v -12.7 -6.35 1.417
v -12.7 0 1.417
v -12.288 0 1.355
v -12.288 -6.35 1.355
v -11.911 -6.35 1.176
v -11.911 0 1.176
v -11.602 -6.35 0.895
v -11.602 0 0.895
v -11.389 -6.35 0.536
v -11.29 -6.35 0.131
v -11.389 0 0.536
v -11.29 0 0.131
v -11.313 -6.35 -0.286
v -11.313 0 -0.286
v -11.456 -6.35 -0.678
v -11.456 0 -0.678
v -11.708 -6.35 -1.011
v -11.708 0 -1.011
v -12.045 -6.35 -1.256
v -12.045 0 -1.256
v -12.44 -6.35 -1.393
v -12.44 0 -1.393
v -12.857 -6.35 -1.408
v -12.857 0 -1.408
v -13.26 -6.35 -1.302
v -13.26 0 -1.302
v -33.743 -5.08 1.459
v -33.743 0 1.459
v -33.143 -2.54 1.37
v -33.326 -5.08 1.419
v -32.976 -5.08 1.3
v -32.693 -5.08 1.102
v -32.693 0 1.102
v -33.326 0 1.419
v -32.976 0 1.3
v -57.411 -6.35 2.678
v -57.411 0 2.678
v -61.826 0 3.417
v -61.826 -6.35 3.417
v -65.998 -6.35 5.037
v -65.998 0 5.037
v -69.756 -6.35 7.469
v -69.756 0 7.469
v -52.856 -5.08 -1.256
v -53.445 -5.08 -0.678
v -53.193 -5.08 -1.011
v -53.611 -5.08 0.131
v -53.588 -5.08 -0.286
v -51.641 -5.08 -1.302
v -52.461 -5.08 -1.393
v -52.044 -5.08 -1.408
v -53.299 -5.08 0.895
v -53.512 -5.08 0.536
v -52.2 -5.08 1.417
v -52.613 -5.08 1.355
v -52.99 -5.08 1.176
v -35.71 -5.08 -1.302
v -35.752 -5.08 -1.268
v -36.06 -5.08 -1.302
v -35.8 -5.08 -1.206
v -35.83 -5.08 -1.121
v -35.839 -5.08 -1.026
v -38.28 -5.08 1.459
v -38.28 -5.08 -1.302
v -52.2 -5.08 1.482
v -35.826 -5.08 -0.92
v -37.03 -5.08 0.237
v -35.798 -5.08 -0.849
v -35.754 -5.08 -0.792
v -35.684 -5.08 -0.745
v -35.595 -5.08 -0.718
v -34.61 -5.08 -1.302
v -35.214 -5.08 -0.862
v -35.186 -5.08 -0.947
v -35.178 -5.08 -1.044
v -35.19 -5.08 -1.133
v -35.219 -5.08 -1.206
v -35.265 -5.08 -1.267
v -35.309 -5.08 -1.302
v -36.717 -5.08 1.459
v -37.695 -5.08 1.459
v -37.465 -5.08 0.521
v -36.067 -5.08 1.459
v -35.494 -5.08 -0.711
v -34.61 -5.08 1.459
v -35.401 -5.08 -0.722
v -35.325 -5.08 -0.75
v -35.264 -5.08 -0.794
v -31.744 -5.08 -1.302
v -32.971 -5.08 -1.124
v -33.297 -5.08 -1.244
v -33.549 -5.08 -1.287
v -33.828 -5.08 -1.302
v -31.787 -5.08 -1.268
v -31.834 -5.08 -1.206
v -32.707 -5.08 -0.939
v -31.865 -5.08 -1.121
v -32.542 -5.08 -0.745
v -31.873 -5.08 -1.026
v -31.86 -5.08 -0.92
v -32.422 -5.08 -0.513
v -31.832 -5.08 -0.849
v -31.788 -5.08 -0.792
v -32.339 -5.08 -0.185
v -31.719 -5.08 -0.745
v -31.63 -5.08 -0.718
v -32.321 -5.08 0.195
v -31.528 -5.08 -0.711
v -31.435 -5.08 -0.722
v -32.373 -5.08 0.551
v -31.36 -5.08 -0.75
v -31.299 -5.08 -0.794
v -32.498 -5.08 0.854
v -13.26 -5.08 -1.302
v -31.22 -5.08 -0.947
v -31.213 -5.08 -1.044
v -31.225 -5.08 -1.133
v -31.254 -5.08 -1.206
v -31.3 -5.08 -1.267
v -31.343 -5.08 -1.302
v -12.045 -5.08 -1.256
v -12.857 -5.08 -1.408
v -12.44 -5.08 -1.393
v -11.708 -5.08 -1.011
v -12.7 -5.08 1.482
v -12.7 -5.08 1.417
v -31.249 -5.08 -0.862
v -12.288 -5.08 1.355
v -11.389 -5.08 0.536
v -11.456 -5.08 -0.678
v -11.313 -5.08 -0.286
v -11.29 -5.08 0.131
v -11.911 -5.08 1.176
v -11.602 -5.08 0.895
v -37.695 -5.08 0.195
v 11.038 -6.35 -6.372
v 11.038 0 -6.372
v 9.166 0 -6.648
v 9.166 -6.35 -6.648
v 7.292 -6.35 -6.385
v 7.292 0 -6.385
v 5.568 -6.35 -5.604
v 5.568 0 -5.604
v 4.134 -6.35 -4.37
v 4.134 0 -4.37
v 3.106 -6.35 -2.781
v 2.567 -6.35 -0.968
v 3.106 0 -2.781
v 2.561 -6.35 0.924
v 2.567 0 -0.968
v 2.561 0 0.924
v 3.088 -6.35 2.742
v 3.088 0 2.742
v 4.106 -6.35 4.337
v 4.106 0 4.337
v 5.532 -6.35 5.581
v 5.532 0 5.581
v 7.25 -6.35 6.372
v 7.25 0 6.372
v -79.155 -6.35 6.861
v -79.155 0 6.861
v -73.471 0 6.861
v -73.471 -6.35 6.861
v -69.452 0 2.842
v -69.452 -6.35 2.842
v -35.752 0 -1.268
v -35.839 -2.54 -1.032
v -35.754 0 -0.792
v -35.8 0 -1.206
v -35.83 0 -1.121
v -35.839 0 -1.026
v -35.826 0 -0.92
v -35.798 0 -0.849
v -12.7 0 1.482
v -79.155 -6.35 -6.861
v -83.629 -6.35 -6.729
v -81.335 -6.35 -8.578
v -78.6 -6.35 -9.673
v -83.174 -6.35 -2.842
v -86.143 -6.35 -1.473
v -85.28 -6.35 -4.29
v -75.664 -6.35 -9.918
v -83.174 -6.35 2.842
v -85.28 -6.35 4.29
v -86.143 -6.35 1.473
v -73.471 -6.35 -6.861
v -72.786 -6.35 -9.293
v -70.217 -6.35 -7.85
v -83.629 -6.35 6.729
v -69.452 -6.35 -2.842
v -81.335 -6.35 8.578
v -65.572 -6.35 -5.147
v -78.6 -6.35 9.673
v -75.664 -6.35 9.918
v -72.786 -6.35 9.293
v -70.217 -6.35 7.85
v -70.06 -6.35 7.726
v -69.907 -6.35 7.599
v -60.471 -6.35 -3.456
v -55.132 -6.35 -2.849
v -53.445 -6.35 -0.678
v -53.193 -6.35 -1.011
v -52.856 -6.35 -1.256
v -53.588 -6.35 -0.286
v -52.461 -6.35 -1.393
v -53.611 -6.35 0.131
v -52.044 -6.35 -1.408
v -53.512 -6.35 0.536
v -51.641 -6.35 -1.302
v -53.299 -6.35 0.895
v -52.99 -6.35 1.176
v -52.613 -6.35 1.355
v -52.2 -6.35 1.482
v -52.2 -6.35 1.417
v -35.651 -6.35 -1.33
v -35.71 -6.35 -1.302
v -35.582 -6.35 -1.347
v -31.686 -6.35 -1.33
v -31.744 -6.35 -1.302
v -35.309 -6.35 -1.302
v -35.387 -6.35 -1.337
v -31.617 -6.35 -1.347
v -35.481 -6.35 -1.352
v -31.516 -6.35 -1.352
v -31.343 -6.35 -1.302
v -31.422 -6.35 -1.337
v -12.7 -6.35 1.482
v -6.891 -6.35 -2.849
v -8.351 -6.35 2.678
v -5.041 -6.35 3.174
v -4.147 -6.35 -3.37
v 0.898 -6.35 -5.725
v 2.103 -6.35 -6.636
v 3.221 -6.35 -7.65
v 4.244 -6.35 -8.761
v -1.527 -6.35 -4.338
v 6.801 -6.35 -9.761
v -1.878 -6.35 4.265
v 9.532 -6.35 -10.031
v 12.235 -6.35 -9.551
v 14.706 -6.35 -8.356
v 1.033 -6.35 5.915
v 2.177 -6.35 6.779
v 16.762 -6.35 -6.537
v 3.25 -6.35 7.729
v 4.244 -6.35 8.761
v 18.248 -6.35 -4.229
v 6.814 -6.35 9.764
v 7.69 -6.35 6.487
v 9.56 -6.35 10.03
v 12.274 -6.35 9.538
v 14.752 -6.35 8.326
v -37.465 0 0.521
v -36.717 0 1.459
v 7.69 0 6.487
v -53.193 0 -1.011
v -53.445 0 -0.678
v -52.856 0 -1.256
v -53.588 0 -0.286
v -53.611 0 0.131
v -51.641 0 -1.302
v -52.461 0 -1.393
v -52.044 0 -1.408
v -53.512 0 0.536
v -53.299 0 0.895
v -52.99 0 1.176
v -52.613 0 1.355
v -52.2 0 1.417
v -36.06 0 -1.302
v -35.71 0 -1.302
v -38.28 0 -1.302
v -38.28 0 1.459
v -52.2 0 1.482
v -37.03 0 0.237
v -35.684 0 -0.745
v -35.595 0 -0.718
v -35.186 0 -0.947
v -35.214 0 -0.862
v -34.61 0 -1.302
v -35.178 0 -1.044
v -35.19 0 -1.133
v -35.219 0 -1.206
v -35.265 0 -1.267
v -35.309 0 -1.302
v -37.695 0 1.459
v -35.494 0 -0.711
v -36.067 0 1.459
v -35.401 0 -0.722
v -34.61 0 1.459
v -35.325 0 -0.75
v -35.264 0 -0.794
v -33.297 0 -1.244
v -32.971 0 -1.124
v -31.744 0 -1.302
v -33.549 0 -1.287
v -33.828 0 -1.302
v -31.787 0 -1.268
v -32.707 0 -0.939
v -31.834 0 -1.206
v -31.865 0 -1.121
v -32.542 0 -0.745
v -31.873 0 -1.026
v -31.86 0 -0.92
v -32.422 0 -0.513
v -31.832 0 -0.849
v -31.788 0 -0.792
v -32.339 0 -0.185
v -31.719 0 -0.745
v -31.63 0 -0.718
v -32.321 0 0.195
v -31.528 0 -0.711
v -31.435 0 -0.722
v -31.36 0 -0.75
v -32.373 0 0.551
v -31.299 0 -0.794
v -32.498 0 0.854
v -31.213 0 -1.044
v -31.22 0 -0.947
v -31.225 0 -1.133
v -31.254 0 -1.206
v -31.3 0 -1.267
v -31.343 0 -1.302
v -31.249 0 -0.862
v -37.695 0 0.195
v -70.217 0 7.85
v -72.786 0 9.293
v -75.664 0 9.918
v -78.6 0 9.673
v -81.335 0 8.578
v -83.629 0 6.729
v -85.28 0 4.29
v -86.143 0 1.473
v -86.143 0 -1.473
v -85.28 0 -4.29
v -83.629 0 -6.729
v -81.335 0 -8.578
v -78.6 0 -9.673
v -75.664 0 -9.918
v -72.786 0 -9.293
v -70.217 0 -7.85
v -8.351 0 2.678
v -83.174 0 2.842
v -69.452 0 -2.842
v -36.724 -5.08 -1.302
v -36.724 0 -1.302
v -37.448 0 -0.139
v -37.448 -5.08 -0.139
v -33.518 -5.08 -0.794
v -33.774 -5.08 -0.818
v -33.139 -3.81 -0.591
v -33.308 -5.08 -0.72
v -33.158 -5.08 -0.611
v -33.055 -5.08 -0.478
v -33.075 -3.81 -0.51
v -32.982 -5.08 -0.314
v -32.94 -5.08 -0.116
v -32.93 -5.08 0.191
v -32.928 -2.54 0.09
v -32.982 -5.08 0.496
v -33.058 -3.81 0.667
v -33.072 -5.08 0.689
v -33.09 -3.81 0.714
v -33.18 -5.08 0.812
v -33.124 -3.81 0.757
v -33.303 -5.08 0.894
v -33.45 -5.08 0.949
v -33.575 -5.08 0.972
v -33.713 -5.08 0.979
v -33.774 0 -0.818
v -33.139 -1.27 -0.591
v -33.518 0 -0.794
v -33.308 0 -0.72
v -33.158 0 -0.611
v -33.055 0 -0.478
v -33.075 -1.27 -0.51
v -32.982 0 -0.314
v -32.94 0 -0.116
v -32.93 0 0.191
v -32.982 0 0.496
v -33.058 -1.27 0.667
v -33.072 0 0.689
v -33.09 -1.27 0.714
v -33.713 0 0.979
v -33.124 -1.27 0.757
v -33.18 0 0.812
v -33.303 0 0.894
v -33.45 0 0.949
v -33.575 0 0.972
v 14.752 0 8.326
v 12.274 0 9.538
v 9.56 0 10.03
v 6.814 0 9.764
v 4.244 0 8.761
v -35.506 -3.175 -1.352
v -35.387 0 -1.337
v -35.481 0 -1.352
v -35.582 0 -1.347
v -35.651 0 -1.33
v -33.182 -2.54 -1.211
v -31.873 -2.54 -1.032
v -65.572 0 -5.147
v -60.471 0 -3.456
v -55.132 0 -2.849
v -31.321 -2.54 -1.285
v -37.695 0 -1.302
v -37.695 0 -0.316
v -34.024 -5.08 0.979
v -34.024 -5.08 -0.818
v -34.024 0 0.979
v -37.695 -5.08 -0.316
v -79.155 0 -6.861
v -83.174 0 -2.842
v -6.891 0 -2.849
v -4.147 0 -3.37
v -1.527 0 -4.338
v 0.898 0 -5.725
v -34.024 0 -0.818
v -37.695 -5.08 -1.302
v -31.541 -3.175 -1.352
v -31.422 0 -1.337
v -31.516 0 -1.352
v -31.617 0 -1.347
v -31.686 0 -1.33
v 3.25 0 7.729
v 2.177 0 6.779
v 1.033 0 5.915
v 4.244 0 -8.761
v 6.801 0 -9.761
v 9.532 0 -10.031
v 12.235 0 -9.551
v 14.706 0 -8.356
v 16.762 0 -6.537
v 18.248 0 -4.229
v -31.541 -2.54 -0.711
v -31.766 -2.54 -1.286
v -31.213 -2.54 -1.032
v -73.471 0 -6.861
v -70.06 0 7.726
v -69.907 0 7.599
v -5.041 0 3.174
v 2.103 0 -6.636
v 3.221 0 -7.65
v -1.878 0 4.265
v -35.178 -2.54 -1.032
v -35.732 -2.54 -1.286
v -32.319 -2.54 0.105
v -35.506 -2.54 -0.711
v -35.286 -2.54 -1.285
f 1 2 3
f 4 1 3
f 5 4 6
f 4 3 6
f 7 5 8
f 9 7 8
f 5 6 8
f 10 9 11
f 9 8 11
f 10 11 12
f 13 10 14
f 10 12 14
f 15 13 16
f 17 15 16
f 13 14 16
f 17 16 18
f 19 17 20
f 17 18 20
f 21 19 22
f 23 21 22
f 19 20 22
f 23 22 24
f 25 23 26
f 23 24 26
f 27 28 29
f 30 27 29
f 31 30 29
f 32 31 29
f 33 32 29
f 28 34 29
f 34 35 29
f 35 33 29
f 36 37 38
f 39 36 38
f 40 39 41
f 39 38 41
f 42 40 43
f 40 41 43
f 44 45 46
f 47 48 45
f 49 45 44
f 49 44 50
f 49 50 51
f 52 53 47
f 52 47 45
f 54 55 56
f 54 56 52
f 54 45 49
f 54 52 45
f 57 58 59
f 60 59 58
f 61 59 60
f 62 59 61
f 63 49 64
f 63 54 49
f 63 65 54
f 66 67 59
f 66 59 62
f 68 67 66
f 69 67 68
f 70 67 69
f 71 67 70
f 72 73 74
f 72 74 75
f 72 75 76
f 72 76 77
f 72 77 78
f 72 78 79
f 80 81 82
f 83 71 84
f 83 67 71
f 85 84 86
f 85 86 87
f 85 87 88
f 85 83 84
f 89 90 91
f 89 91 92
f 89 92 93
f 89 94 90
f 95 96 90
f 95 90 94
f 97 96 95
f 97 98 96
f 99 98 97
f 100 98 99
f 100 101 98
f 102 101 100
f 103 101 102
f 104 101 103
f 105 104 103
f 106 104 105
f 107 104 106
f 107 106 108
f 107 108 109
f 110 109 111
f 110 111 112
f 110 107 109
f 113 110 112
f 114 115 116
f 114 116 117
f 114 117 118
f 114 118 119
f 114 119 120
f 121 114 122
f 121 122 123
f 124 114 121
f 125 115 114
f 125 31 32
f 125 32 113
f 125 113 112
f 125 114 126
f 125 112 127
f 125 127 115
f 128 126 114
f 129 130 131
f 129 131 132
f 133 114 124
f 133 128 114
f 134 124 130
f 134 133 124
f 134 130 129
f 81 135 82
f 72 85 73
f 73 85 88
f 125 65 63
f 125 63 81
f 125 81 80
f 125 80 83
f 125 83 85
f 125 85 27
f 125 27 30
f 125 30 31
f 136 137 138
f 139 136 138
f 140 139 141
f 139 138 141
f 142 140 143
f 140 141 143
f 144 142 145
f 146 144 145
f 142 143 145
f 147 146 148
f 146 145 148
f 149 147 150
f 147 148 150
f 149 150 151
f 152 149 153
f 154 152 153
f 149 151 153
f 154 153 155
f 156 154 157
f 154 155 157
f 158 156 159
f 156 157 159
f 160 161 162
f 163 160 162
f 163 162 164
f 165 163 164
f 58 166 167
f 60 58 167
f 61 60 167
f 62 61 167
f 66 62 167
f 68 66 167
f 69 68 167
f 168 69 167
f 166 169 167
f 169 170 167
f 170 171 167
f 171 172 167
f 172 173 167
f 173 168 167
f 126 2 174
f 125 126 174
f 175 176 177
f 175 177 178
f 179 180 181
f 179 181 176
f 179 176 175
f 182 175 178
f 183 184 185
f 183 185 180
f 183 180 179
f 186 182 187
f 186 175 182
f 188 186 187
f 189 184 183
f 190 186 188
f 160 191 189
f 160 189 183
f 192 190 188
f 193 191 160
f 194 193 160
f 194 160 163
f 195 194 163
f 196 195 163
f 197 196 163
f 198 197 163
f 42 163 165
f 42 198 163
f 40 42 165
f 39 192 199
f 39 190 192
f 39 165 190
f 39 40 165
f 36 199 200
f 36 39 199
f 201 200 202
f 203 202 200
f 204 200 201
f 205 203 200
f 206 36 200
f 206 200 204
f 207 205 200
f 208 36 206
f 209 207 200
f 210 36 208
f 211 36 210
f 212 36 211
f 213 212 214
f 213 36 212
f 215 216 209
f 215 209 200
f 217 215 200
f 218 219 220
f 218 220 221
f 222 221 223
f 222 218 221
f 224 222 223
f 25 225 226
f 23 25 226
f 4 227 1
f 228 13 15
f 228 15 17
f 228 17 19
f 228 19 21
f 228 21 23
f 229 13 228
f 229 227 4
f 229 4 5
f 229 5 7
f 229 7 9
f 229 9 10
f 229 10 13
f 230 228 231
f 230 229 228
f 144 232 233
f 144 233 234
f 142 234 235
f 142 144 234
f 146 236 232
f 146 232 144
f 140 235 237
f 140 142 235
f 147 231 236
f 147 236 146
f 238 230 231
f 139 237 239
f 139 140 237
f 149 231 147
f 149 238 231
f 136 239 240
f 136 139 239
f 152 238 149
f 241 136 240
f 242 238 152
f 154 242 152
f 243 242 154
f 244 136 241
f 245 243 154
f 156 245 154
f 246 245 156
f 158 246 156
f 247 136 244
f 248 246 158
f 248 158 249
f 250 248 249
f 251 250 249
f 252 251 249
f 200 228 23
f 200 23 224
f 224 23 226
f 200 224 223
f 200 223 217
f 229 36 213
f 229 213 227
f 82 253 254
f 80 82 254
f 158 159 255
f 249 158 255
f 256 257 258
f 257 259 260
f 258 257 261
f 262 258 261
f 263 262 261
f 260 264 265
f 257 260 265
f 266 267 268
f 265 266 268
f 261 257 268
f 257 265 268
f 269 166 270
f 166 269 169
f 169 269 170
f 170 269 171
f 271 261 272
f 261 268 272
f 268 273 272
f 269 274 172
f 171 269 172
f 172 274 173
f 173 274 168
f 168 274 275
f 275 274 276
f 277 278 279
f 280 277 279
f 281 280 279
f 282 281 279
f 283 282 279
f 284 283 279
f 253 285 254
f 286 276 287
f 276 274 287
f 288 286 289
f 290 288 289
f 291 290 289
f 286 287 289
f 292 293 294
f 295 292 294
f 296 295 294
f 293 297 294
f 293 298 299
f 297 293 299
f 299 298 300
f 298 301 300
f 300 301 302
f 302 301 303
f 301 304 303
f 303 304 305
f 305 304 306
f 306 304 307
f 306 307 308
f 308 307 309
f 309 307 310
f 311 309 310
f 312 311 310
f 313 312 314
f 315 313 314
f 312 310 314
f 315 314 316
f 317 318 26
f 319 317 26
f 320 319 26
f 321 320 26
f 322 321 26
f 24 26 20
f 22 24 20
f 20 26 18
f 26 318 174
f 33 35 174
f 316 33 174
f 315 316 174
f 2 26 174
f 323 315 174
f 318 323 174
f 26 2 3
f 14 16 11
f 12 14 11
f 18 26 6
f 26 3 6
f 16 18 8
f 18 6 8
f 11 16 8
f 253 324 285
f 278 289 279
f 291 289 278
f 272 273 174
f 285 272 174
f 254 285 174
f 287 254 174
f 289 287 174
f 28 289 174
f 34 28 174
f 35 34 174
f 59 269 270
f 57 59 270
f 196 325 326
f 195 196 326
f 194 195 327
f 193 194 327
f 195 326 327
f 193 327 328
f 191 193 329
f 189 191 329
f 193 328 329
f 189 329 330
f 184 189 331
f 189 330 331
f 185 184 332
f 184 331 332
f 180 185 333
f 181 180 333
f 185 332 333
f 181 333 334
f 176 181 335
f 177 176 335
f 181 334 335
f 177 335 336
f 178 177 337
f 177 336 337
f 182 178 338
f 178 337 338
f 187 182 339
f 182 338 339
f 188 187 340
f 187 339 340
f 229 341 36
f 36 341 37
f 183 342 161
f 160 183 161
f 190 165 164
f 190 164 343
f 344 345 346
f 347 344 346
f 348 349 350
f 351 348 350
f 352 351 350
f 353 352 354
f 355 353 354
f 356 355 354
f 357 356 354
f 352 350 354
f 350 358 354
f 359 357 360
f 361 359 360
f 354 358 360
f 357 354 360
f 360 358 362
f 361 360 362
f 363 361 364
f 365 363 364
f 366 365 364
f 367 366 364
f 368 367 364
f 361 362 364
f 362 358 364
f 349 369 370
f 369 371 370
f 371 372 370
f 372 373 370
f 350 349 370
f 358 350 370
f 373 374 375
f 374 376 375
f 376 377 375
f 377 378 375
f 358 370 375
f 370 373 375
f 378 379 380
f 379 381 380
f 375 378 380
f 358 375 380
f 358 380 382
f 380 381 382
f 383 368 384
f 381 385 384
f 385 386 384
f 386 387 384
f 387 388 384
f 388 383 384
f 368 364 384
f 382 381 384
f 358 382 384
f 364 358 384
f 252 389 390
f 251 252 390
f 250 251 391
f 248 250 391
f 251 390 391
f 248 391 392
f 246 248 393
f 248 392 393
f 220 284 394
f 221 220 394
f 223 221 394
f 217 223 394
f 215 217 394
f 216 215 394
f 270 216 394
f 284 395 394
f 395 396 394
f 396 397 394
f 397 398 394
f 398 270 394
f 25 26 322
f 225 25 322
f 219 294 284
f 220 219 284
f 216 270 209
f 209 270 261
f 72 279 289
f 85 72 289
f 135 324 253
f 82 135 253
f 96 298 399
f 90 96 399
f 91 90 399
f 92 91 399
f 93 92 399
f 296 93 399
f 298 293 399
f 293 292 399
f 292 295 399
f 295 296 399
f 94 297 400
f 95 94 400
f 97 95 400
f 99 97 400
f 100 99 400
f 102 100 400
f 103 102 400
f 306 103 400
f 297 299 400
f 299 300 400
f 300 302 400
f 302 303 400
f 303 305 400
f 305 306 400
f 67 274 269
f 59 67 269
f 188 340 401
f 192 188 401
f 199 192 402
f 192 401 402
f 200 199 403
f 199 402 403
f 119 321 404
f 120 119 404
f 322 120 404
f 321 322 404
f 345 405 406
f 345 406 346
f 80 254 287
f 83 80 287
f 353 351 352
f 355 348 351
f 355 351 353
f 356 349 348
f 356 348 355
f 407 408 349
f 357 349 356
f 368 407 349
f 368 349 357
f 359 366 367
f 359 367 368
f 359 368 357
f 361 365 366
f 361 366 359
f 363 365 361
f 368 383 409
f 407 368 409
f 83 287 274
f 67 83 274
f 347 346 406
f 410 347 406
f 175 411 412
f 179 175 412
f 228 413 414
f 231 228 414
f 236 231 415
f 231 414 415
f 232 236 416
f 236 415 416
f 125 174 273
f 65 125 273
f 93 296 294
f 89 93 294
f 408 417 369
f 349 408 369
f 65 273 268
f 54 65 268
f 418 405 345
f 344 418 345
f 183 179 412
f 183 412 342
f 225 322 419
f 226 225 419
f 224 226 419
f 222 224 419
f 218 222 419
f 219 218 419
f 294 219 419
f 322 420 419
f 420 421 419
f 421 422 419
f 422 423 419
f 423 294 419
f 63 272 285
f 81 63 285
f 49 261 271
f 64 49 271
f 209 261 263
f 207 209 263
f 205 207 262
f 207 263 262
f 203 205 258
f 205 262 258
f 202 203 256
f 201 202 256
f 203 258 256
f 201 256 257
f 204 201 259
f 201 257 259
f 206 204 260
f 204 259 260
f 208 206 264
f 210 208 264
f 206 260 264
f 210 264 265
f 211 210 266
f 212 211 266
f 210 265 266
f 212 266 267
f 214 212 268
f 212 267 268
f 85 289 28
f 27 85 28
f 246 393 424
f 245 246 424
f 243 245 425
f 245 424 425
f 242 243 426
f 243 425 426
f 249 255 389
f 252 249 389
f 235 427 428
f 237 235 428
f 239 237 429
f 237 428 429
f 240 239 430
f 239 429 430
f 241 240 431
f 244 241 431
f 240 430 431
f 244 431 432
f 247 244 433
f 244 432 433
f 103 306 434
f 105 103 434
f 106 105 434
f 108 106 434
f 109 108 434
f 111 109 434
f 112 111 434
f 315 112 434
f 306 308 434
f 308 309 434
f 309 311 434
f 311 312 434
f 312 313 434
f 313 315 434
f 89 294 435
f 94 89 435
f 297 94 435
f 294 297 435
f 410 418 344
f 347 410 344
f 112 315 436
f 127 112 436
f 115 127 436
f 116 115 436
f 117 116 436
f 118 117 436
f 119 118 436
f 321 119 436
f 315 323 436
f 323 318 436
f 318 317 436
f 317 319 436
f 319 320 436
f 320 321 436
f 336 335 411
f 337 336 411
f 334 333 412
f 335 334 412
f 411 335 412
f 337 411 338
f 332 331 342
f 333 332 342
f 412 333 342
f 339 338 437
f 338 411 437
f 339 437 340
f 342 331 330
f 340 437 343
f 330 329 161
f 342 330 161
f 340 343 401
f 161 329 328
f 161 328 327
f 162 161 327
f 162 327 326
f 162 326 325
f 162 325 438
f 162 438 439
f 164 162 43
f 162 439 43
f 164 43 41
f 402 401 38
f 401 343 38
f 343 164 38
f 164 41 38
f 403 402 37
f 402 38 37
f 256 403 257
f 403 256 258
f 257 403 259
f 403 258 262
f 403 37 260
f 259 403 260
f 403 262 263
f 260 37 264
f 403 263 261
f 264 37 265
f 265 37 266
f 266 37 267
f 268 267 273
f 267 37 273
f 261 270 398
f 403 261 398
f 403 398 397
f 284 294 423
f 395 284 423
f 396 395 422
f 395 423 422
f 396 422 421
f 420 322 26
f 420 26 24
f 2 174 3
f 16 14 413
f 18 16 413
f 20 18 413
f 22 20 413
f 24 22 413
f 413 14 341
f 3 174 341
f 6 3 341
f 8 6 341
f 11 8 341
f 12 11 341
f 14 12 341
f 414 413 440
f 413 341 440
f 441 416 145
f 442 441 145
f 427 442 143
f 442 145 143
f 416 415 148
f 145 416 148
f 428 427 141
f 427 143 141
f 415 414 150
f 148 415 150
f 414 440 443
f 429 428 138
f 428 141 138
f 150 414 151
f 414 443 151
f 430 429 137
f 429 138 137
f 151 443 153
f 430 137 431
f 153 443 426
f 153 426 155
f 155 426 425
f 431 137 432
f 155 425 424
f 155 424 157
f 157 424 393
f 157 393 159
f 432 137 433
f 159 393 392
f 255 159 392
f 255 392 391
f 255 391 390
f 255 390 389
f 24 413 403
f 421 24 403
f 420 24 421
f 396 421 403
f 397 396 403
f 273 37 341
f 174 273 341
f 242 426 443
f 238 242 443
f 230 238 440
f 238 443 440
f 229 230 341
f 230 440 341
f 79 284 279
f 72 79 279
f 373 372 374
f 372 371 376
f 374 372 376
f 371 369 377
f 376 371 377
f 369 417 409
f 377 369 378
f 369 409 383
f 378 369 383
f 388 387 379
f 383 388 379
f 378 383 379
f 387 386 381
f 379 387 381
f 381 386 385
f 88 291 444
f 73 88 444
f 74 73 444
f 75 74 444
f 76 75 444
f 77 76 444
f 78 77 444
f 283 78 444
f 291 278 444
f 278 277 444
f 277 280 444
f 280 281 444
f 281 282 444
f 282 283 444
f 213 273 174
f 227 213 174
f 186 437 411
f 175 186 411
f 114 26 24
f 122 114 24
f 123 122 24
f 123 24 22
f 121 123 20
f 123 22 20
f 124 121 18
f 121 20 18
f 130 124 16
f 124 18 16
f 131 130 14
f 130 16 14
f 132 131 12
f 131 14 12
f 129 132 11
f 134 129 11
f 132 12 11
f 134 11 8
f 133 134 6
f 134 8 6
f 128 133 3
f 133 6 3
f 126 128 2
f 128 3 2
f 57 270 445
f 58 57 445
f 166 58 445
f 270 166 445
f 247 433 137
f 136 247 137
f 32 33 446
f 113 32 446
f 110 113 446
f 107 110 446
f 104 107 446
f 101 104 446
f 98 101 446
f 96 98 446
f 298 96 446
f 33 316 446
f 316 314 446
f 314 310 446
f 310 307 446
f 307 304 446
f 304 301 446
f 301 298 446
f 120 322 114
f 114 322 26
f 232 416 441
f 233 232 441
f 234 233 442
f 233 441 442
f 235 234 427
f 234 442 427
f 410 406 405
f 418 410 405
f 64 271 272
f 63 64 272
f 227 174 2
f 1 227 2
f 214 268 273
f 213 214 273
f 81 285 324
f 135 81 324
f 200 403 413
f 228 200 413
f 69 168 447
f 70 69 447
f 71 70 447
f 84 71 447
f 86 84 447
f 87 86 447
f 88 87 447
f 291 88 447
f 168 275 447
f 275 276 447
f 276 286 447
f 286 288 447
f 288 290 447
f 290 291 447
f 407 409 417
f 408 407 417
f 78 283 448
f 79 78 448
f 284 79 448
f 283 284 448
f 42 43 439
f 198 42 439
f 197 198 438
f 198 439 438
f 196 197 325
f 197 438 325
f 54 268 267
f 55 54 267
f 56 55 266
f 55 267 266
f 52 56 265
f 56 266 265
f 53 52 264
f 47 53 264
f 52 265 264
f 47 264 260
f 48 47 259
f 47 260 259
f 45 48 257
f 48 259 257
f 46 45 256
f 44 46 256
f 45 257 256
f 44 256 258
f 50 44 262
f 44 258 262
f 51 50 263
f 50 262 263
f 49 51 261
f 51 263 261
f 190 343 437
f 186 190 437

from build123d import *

# Parameters (mm, degrees)
F1_DEPTH = 5.08
F2_DEPTH = 6.35


with BuildPart() as f1:
    # F0 (on Front) → F1 (new body)
    with BuildSketch(Plane.XZ):
        Polygon((-37.6947642991, -0.3162783257), (-37.6947642991, -1.3017182937), (-36.7244291742, -1.3017182937), (-37.4476490649, -0.1386453701), align=None)
    extrude(amount=F1_DEPTH)


with BuildPart() as f1b:
    # F0 (on Front) → F1, piece 2 (new body)
    with BuildSketch(Plane.XZ):
        with BuildLine():
            add(Edge.make_bspline(
                [(-33.7735470137, -0.8183633124), (-32.9276757965, -0.8183633124), (-32.9276757965, 0.0897398586)],
                knots=[0, 0, 0, 1, 1, 1], degree=2))
            add(Edge.make_bspline(
                [(-32.9276757965, 0.0897398586), (-32.9276757965, 0.9791130241), (-33.7131276411, 0.9791130241)],
                knots=[0, 0, 0, 1, 1, 1], degree=2))
            Line((-33.7131276411, 0.9791130241), (-34.0242874102, 0.9791130241))
            Line((-34.0242874102, 0.9791130241), (-34.0242874102, -0.8183633124))
            Line((-34.0242874102, -0.8183633124), (-33.7735470137, -0.8183633124))
        make_face()
    extrude(amount=F1_DEPTH)


with BuildPart() as f1c:
    # F0 (on Front) → F1, piece 3 (new body)
    with BuildSketch(Plane.XZ):
        with BuildLine():
            ThreePointArc((-52.2002466023, 1.4169405788), (-53.5880827015, -0.2857123828), (-51.6405591111, -1.3017182937))
            Line((-51.6405591111, -1.3017182937), (-38.2802280201, -1.3017182937))
            Line((-38.2802280201, -1.3017182937), (-38.2802280201, 1.4588428429))
            Line((-38.2802280201, 1.4588428429), (-37.6947642991, 1.4588428429))
            Line((-37.6947642991, 1.4588428429), (-37.6947642991, 0.1954737607))
            Line((-37.6947642991, 0.1954737607), (-37.4645664893, 0.5205299856))
            Line((-37.4645664893, 0.5205299856), (-36.7165746558, 1.4588428429))
            Line((-36.7165746558, 1.4588428429), (-36.0670663997, 1.4588428429))
            Line((-36.0670663997, 1.4588428429), (-37.0301511999, 0.2371631278))
            Line((-37.0301511999, 0.2371631278), (-36.059816075, -1.3017182937))
            Line((-36.059816075, -1.3017182937), (-35.7097975851, -1.3017182937))
            add(Edge.make_bspline(
                [(-35.7097975851, -1.3017182937), (-35.7326776428, -1.2871840866), (-35.7519793713, -1.2684876387)],
                knots=[0.7773779948, 0.7773779948, 0.7773779948, 1, 1, 1], degree=2))
            add(Edge.make_bspline(
                [(-35.7519793713, -1.2684876387), (-35.8386811711, -1.1845047107), (-35.8386811711, -1.0316436979)],
                knots=[0, 0, 0, 1, 1, 1], degree=2))
            add(Edge.make_bspline(
                [(-35.8386811711, -1.0316436979), (-35.8386811711, -0.8733449416), (-35.7537919525, -0.7920808853)],
                knots=[0, 0, 0, 1, 1, 1], degree=2))
            add(Edge.make_bspline(
                [(-35.7537919525, -0.7920808853), (-35.6689027339, -0.7108168291), (-35.5063746215, -0.7108168291)],
                knots=[0, 0, 0, 1, 1, 1], degree=2))
            add(Edge.make_bspline(
                [(-35.5063746215, -0.7108168291), (-35.3498884463, -0.7108168291), (-35.2640929371, -0.7938934665)],
                knots=[0, 0, 0, 1, 1, 1], degree=2))
            add(Edge.make_bspline(
                [(-35.2640929371, -0.7938934665), (-35.178297428, -0.8769701039), (-35.178297428, -1.0316436979)],
                knots=[0, 0, 0, 1, 1, 1], degree=2))
            add(Edge.make_bspline(
                [(-35.178297428, -1.0316436979), (-35.178297428, -1.1808795484), (-35.2649992277, -1.2666750575)],
                knots=[0, 0, 0, 1, 1, 1], degree=2))
            add(Edge.make_bspline(
                [(-35.2649992277, -1.2666750575), (-35.2850167295, -1.2864833171), (-35.3086574309, -1.3017182937)],
                knots=[0, 0, 0, 0.2308775808, 0.2308775808, 0.2308775808], degree=2))
            Line((-35.3086574309, -1.3017182937), (-34.6097511313, -1.3017182937))
            Line((-34.6097511313, -1.3017182937), (-34.6097511313, 1.4588428429))
            Line((-34.6097511313, 1.4588428429), (-33.7433373274, 1.4588428429))
            add(Edge.make_bspline(
                [(-33.7433373274, 1.4588428429), (-33.0672445474, 1.4588428429), (-32.6932486306, 1.1020664474)],
                knots=[0, 0, 0, 1, 1, 1], degree=2))
            add(Edge.make_bspline(
                [(-32.6932486306, 1.1020664474), (-32.3192527139, 0.7452900519), (-32.3192527139, 0.1048447017)],
                knots=[0, 0, 0, 1, 1, 1], degree=2))
            add(Edge.make_bspline(
                [(-32.3192527139, 0.1048447017), (-32.3192527139, -0.5766858218), (-32.7074471832, -0.9392020578)],
                knots=[0, 0, 0, 1, 1, 1], degree=2))
            add(Edge.make_bspline(
                [(-32.7074471832, -0.9392020578), (-33.0956416525, -1.3017182937), (-33.8279244491, -1.3017182937)],
                knots=[0, 0, 0, 1, 1, 1], degree=2))
            Line((-33.8279244491, -1.3017182937), (-31.7444741577, -1.3017182937))
            add(Edge.make_bspline(
                [(-31.7444741577, -1.3017182937), (-31.7673542154, -1.2871840866), (-31.7866559439, -1.2684876387)],
                knots=[0.7773779948, 0.7773779948, 0.7773779948, 1, 1, 1], degree=2))
            add(Edge.make_bspline(
                [(-31.7866559439, -1.2684876387), (-31.8733577437, -1.1845047107), (-31.8733577437, -1.0316436979)],
                knots=[0, 0, 0, 1, 1, 1], degree=2))
            add(Edge.make_bspline(
                [(-31.8733577437, -1.0316436979), (-31.8733577437, -0.8733449416), (-31.7884685251, -0.7920808853)],
                knots=[0, 0, 0, 1, 1, 1], degree=2))
            add(Edge.make_bspline(
                [(-31.7884685251, -0.7920808853), (-31.7035793065, -0.7108168291), (-31.5410511941, -0.7108168291)],
                knots=[0, 0, 0, 1, 1, 1], degree=2))
            add(Edge.make_bspline(
                [(-31.5410511941, -0.7108168291), (-31.3845650189, -0.7108168291), (-31.2987695098, -0.7938934665)],
                knots=[0, 0, 0, 1, 1, 1], degree=2))
            add(Edge.make_bspline(
                [(-31.2987695098, -0.7938934665), (-31.2129740006, -0.8769701039), (-31.2129740006, -1.0316436979)],
                knots=[0, 0, 0, 1, 1, 1], degree=2))
            add(Edge.make_bspline(
                [(-31.2129740006, -1.0316436979), (-31.2129740006, -1.1808795484), (-31.2996758003, -1.2666750575)],
                knots=[0, 0, 0, 1, 1, 1], degree=2))
            add(Edge.make_bspline(
                [(-31.2996758003, -1.2666750575), (-31.3196933021, -1.2864833171), (-31.3433340035, -1.3017182937)],
                knots=[0, 0, 0, 0.2308775808, 0.2308775808, 0.2308775808], degree=2))
            Line((-31.3433340035, -1.3017182937), (-13.2601651062, -1.3017182937))
            ThreePointArc((-13.2601651062, -1.3017182937), (-11.3126415158, -0.2857123828), (-12.700477615, 1.4169405788))
            Line((-12.700477615, 1.4169405788), (-12.700477615, 1.4824063983))
            Line((-12.700477615, 1.4824063983), (-52.2002466023, 1.4824063983))
            Line((-52.2002466023, 1.4824063983), (-52.2002466023, 1.4169405788))
        make_face()
    extrude(amount=F1_DEPTH)


with BuildPart() as f2:
    # F0 (on Front) → F2 (new body)
    with BuildSketch(Plane.XZ):
        with BuildLine():
            ThreePointArc((-69.7555214797, 7.4693989174), (-69.9874280313, 7.658312579), (-70.216737524, 7.8503703223))
            ThreePointArc((-70.216737524, 7.8503703223), (-86.2529528158, 0), (-70.216737524, -7.8503703223))
            ThreePointArc((-70.216737524, -7.8503703223), (-67.3859848234, -4.37028343), (-66.3736665078, 0))
            ThreePointArc((-66.3736665078, 0), (-67.2585158917, 4.0996604505), (-69.7555214797, 7.4693989174))
        make_face()
        Polygon((-73.4714453214, 6.860867433), (-69.4524422288, 2.8418643404), (-69.4524422288, -2.8418643404), (-73.4714453214, -6.860867433), (-79.1551740022, -6.860867433), (-83.1741770948, -2.8418643404), (-83.1741770948, 2.8418643404), (-79.1551740022, 6.860867433), align=None, mode=Mode.SUBTRACT)
        with BuildLine():
            ThreePointArc((-69.7555214797, 7.4693989174), (-69.9832627758, 7.6633551692), (-70.216737524, 7.8503703223))
            ThreePointArc((-70.216737524, 7.8503703223), (-69.9874280313, 7.658312579), (-69.7555214797, 7.4693989174))
        make_face()
        with BuildLine():
            ThreePointArc((-66.3736665078, 0), (-67.3859848234, -4.37028343), (-70.216737524, -7.8503703223))
            ThreePointArc((-70.216737524, -7.8503703223), (-63.0654222914, -4.1698569866), (-55.1318026872, -2.8488089384))
            ThreePointArc((-55.1318026872, -2.8488089384), (-54.8756379392, -2.8475480962), (-54.6194731912, -2.8488089384))
            Line((-54.6194731912, -2.8488089384), (-10.4214928767, -2.8488089384))
            ThreePointArc((-10.4214928767, -2.8488089384), (-8.6562693679, -2.7561400258), (-6.8910458592, -2.8488089384))
            ThreePointArc((-6.8910458592, -2.8488089384), (-2.8167428022, -3.7997768938), (0.8979261583, -5.7247496122))
            ThreePointArc((0.8979261583, -5.7247496122), (0.0931355174, -4.3419284773), (-0.481735172, -2.8488089384))
            ThreePointArc((-0.481735172, -2.8488089384), (-0.8940591369, -0.0886462018), (-0.5305457237, 2.6783679621))
            ThreePointArc((-0.5305457237, 2.6783679621), (0.1053141536, 4.3672244014), (1.0332730926, 5.9149472653))
            ThreePointArc((1.0332730926, 5.9149472653), (-3.4345991731, 3.6465000935), (-8.3509449023, 2.6783679621))
            ThreePointArc((-8.3509449023, 2.6783679621), (-9.3862188895, 2.6489862369), (-10.4214928767, 2.6783679621))
            Line((-10.4214928767, 2.6783679621), (-54.6194731912, 2.6783679621))
            ThreePointArc((-54.6194731912, 2.6783679621), (-56.0152814214, 2.6339217613), (-57.4110896516, 2.6783679621))
            ThreePointArc((-57.4110896516, 2.6783679621), (-63.953384712, 4.1203482121), (-69.7555214797, 7.4693989174))
            ThreePointArc((-69.7555214797, 7.4693989174), (-67.2585158917, 4.0996604505), (-66.3736665078, 0))
        make_face()
        with BuildLine():
            Line((-38.2802280201, -1.3017182937), (-51.6405591111, -1.3017182937))
            ThreePointArc((-51.6405591111, -1.3017182937), (-53.5880827015, -0.2857123828), (-52.2002466023, 1.4169405788))
            Line((-52.2002466023, 1.4169405788), (-52.2002466023, 1.4824063983))
            Line((-52.2002466023, 1.4824063983), (-12.700477615, 1.4824063983))
            Line((-12.700477615, 1.4824063983), (-12.700477615, 1.4169405788))
            ThreePointArc((-12.700477615, 1.4169405788), (-11.3126415158, -0.2857123828), (-13.2601651062, -1.3017182937))
            Line((-13.2601651062, -1.3017182937), (-31.3433340035, -1.3017182937))
            add(Edge.make_bspline(
                [(-31.3433340035, -1.3017182937), (-31.4220882653, -1.3524705667), (-31.5410511941, -1.3524705667)],
                knots=[0.2308775808, 0.2308775808, 0.2308775808, 1, 1, 1], degree=2))
            add(Edge.make_bspline(
                [(-31.5410511941, -1.3524705667), (-31.6645788508, -1.3524705667), (-31.7444741577, -1.3017182937)],
                knots=[0, 0, 0, 0.7773779948, 0.7773779948, 0.7773779948], degree=2))
            Line((-31.7444741577, -1.3017182937), (-33.8279244491, -1.3017182937))
            Line((-33.8279244491, -1.3017182937), (-34.6097511313, -1.3017182937))
            Line((-34.6097511313, -1.3017182937), (-35.3086574309, -1.3017182937))
            add(Edge.make_bspline(
                [(-35.3086574309, -1.3017182937), (-35.3874116927, -1.3524705667), (-35.5063746215, -1.3524705667)],
                knots=[0.2308775808, 0.2308775808, 0.2308775808, 1, 1, 1], degree=2))
            add(Edge.make_bspline(
                [(-35.5063746215, -1.3524705667), (-35.6299022782, -1.3524705667), (-35.7097975851, -1.3017182937)],
                knots=[0, 0, 0, 0.7773779948, 0.7773779948, 0.7773779948], degree=2))
            Line((-35.7097975851, -1.3017182937), (-36.059816075, -1.3017182937))
            Line((-36.059816075, -1.3017182937), (-36.7244291742, -1.3017182937))
            Line((-36.7244291742, -1.3017182937), (-37.6947642991, -1.3017182937))
            Line((-37.6947642991, -1.3017182937), (-38.2802280201, -1.3017182937))
        make_face(mode=Mode.SUBTRACT)
        with BuildLine():
            ThreePointArc((-54.6194731912, -2.8488089384), (-54.8756379392, -2.8475480962), (-55.1318026872, -2.8488089384))
            Line((-55.1318026872, -2.8488089384), (-54.6194731912, -2.8488089384))
        make_face()
        with BuildLine():
            Line((-54.6194731912, 2.6783679621), (-57.4110896516, 2.6783679621))
            ThreePointArc((-57.4110896516, 2.6783679621), (-56.0152814214, 2.6339217613), (-54.6194731912, 2.6783679621))
        make_face()
        with BuildLine():
            ThreePointArc((-6.8910458592, -2.8488089384), (-8.6562693679, -2.7561400258), (-10.4214928767, -2.8488089384))
            Line((-10.4214928767, -2.8488089384), (-6.8910458592, -2.8488089384))
        make_face()
        with BuildLine():
            Line((-8.3509449023, 2.6783679621), (-10.4214928767, 2.6783679621))
            ThreePointArc((-10.4214928767, 2.6783679621), (-9.3862188895, 2.6489862369), (-8.3509449023, 2.6783679621))
        make_face()
        with BuildLine():
            ThreePointArc((-0.481735172, -2.8488089384), (0.0931355174, -4.3419284773), (0.8979261583, -5.7247496122))
            ThreePointArc((0.8979261583, -5.7247496122), (2.6732616169, -7.1304617501), (4.2441949289, -8.7614158066))
            ThreePointArc((4.2441949289, -8.7614158066), (12.2349623012, -9.550730865), (18.2480584248, -4.2292595958))
            Line((18.2480584248, -4.2292595958), (11.0378986921, -6.3722072966))
            ThreePointArc((11.0378986921, -6.3722072966), (2.7717934125, -1.8938979831), (7.250102726, 6.3722072966))
            ThreePointArc((7.250102726, 6.3722072966), (7.4688795623, 6.4331830803), (7.6896116225, 6.4866499664))
            Line((7.6896116225, 6.4866499664), (14.7523274643, 8.3256936423))
            ThreePointArc((14.7523274643, 8.3256936423), (9.5598900503, 10.0298324849), (4.2441949289, 8.7614158066))
            ThreePointArc((4.2441949289, 8.7614158066), (2.7226657843, 7.2435033899), (1.0332730926, 5.9149472653))
            ThreePointArc((1.0332730926, 5.9149472653), (0.1053141536, 4.3672244014), (-0.5305457237, 2.6783679621))
            ThreePointArc((-0.5305457237, 2.6783679621), (-0.8940591369, -0.0886462018), (-0.481735172, -2.8488089384))
        make_face()
        with BuildLine():
            Line((7.250102726, 6.3722072966), (7.6896116225, 6.4866499664))
            ThreePointArc((7.6896116225, 6.4866499664), (7.4688795623, 6.4331830803), (7.250102726, 6.3722072966))
        make_face()
    extrude(amount=F2_DEPTH)


solid = Compound([f1.part, f1b.part, f1c.part, f2.part])
